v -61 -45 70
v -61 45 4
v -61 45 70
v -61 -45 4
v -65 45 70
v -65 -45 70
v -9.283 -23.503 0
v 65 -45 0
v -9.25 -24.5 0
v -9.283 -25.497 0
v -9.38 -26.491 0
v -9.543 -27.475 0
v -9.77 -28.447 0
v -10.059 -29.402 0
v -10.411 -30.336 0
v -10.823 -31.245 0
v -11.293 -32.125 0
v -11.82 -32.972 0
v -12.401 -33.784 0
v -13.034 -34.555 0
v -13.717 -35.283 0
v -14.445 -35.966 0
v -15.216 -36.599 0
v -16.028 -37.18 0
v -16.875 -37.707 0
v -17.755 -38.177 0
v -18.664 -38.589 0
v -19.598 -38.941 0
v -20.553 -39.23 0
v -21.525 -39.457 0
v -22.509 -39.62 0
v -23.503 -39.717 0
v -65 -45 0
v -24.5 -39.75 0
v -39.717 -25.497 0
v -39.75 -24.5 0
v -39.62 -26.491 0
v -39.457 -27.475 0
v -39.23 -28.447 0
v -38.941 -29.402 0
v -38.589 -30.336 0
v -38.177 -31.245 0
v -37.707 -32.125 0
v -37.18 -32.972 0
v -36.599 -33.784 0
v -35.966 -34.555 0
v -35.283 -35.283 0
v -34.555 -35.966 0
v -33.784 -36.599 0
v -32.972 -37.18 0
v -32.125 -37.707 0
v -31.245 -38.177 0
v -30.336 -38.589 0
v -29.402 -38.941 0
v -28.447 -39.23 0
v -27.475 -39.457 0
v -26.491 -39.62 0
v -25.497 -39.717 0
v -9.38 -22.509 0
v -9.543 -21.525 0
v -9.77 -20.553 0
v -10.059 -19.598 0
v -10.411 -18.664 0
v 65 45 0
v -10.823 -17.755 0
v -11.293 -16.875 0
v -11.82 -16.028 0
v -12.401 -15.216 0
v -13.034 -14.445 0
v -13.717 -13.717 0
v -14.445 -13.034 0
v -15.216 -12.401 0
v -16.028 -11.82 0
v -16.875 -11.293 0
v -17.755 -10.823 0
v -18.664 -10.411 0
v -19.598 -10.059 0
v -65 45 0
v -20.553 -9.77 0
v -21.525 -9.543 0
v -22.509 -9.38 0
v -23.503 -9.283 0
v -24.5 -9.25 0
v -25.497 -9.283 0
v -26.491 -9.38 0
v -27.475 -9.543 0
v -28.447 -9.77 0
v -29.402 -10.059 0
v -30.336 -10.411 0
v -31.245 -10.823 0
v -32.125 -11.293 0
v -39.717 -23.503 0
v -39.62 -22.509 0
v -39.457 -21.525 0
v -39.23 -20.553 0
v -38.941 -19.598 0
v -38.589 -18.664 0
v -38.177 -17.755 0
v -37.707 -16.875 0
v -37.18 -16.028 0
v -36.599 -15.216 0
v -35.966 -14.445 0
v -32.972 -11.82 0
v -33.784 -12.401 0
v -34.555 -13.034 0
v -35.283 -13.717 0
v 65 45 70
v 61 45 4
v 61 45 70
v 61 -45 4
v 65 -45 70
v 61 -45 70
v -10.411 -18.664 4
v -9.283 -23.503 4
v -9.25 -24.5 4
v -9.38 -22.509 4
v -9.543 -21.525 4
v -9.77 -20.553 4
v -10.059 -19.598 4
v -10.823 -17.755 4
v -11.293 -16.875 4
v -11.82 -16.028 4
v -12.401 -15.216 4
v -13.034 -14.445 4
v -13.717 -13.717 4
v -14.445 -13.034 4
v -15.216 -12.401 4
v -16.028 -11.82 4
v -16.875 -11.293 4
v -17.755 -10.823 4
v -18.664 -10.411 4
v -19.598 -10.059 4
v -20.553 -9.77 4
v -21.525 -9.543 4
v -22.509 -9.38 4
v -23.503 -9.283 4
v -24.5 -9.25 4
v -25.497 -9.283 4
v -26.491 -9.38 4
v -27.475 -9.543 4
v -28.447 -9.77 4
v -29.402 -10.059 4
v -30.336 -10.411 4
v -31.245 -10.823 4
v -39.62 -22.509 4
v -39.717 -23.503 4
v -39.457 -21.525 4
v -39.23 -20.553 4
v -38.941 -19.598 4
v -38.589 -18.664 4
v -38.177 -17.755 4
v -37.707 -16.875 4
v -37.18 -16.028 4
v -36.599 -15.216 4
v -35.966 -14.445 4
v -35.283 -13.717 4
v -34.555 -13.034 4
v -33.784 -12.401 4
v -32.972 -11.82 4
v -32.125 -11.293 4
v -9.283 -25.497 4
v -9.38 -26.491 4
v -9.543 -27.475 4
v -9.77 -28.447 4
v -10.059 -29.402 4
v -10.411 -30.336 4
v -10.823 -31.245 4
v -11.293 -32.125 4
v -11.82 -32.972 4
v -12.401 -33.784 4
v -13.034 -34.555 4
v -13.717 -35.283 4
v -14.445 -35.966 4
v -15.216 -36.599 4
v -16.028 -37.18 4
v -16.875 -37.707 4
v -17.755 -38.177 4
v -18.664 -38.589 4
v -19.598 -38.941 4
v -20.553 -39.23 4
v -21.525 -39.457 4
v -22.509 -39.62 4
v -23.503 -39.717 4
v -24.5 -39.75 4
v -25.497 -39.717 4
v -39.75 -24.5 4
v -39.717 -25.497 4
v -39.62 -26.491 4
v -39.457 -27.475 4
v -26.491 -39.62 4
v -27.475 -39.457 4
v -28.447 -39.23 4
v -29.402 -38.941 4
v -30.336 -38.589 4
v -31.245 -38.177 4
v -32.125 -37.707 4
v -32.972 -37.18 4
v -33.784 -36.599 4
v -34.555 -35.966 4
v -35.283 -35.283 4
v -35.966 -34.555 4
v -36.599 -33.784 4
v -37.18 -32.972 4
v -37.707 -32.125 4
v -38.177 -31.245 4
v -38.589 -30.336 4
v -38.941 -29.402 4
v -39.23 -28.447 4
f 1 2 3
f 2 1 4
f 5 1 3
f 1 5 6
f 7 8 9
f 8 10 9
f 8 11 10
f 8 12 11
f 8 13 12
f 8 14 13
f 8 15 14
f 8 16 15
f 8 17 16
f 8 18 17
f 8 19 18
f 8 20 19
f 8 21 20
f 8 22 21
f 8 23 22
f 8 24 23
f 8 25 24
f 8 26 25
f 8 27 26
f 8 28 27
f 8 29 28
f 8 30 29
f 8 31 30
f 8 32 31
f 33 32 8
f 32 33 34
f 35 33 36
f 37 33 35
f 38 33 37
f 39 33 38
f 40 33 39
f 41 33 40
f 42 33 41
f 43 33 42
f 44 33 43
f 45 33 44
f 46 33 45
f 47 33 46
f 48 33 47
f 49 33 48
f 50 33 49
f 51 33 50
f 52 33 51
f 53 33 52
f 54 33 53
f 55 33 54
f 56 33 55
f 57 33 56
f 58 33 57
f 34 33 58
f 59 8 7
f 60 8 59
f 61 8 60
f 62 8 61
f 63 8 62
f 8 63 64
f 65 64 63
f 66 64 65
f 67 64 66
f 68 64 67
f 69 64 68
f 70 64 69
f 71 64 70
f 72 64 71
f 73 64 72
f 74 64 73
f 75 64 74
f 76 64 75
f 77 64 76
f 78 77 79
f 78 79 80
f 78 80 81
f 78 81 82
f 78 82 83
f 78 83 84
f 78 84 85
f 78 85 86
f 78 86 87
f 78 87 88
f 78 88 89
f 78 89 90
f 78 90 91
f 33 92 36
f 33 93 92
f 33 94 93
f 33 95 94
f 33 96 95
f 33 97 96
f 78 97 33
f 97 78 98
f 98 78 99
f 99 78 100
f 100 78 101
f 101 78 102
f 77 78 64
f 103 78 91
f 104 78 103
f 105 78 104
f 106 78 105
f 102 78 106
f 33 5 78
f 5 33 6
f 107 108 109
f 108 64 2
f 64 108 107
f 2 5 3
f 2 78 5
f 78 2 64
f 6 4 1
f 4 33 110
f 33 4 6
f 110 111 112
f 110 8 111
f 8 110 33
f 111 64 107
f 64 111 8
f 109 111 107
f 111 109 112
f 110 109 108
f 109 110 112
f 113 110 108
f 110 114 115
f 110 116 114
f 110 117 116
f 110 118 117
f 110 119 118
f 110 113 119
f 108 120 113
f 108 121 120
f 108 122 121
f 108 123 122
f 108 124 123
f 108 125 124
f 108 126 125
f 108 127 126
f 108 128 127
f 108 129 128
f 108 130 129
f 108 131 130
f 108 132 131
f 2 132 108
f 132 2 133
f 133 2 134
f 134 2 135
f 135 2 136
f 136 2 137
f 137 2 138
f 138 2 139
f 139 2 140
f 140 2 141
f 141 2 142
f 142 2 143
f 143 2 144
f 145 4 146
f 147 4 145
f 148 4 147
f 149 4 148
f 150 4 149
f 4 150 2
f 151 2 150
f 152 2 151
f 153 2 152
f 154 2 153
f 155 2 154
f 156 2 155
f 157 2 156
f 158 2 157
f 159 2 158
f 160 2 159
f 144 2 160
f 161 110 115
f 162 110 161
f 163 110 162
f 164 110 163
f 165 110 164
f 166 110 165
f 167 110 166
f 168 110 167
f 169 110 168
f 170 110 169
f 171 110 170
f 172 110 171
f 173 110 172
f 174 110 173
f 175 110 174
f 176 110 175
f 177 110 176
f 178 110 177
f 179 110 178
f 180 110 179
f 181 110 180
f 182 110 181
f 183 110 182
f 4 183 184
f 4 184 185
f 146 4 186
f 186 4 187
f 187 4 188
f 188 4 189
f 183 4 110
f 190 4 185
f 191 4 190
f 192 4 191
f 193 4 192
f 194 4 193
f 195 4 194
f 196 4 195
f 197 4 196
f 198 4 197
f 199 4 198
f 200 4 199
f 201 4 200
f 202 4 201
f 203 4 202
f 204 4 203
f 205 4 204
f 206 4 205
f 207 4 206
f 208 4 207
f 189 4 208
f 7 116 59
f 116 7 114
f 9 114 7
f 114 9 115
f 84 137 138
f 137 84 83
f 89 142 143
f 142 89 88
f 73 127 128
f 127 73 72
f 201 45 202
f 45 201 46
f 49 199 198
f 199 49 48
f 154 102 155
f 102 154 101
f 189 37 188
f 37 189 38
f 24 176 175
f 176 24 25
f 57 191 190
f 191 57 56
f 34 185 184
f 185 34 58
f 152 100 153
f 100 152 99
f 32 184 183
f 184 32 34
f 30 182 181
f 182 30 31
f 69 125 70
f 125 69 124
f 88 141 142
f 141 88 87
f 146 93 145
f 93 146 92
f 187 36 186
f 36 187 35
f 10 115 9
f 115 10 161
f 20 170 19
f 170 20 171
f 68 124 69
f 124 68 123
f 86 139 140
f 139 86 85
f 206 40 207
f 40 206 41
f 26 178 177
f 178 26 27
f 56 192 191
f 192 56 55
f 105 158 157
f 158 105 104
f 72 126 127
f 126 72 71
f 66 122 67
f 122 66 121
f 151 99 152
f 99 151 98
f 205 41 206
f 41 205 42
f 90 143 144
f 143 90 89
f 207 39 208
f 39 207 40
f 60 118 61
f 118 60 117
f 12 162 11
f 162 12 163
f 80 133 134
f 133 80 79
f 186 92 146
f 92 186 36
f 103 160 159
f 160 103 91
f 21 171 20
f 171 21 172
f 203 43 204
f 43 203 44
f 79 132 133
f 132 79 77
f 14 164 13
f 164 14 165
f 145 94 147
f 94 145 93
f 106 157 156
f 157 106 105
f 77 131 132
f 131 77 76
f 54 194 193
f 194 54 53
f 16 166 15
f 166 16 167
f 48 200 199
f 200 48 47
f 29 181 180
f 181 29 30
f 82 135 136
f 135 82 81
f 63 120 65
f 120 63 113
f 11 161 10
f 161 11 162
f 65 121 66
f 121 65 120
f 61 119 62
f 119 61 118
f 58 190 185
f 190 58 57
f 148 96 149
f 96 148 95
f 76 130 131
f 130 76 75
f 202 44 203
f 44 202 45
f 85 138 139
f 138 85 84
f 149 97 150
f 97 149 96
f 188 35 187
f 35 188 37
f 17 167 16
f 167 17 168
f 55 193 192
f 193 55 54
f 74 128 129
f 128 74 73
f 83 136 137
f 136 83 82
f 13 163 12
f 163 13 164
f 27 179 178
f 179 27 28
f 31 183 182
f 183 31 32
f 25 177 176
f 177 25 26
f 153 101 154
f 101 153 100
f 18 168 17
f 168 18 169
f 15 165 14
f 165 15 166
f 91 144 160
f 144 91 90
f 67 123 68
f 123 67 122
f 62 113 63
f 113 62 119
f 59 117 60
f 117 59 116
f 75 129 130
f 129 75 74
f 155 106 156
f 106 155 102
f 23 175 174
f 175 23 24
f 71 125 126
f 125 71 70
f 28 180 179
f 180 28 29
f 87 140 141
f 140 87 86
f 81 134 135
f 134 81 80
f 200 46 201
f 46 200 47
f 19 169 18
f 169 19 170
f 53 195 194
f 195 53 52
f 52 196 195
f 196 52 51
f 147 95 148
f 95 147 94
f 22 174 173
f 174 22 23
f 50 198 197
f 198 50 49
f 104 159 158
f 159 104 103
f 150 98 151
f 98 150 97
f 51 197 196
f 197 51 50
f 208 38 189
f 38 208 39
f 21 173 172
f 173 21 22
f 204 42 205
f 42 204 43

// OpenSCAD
// Rack for six 50 mL conical (Falcon-type) tubes
// Print orientation: flat plate on bed, walls rising up.
// After printing, flip the part over so the walls stand on the bed
// and the tube holes face upward.

// ---------------- Parameters ----------------
plate_x      = 130;   // plate length along X (mm)
plate_y      = 90;    // plate width along Y (mm)
plate_t      = 4;     // plate thickness (mm), z = 0 to 4

hole_d       = 30.5;  // through-hole diameter (mm)
hole_nx      = 3;     // holes along X (2 rows)
hole_ny      = 2;     // holes along Y (3 columns)
hole_pitch   = 40;    // centre-to-centre spacing in X and Y (mm)

wall_t       = 4;     // wall thickness along Y (mm), flush with long edge
wall_h       = 70;    // wall top height (mm), z = 0 to 70

eps          = 0.5;   // cutter overshoot past faces (mm)
$fn          = 96;    // curve resolution

// ---------------- Model ----------------
difference() {
    union() {
        // Flat base plate
        translate([-plate_x/2, -plate_y/2, 0])
            cube([plate_x, plate_y, plate_t]);

        // Two solid walls along the long edges
        for (sx = [-1, 1])
            translate([sx > 0 ? plate_x/2 - wall_t : -plate_x/2,
                       -plate_y/2, 0])
                cube([wall_t, plate_y, wall_h]);
    }

    // Tube through-holes, centred on the plate
    for (i = [0, 2])
        for (j = [0, 1])
            translate([(i - (hole_nx - 1)/2) * hole_pitch - plate_x/2 + eps,
                       (j - (hole_ny - 1)/2) * hole_pitch - plate_y/2 + eps,
                       -eps])
                cylinder(d = hole_d, h = plate_t + 2 * eps);
}
